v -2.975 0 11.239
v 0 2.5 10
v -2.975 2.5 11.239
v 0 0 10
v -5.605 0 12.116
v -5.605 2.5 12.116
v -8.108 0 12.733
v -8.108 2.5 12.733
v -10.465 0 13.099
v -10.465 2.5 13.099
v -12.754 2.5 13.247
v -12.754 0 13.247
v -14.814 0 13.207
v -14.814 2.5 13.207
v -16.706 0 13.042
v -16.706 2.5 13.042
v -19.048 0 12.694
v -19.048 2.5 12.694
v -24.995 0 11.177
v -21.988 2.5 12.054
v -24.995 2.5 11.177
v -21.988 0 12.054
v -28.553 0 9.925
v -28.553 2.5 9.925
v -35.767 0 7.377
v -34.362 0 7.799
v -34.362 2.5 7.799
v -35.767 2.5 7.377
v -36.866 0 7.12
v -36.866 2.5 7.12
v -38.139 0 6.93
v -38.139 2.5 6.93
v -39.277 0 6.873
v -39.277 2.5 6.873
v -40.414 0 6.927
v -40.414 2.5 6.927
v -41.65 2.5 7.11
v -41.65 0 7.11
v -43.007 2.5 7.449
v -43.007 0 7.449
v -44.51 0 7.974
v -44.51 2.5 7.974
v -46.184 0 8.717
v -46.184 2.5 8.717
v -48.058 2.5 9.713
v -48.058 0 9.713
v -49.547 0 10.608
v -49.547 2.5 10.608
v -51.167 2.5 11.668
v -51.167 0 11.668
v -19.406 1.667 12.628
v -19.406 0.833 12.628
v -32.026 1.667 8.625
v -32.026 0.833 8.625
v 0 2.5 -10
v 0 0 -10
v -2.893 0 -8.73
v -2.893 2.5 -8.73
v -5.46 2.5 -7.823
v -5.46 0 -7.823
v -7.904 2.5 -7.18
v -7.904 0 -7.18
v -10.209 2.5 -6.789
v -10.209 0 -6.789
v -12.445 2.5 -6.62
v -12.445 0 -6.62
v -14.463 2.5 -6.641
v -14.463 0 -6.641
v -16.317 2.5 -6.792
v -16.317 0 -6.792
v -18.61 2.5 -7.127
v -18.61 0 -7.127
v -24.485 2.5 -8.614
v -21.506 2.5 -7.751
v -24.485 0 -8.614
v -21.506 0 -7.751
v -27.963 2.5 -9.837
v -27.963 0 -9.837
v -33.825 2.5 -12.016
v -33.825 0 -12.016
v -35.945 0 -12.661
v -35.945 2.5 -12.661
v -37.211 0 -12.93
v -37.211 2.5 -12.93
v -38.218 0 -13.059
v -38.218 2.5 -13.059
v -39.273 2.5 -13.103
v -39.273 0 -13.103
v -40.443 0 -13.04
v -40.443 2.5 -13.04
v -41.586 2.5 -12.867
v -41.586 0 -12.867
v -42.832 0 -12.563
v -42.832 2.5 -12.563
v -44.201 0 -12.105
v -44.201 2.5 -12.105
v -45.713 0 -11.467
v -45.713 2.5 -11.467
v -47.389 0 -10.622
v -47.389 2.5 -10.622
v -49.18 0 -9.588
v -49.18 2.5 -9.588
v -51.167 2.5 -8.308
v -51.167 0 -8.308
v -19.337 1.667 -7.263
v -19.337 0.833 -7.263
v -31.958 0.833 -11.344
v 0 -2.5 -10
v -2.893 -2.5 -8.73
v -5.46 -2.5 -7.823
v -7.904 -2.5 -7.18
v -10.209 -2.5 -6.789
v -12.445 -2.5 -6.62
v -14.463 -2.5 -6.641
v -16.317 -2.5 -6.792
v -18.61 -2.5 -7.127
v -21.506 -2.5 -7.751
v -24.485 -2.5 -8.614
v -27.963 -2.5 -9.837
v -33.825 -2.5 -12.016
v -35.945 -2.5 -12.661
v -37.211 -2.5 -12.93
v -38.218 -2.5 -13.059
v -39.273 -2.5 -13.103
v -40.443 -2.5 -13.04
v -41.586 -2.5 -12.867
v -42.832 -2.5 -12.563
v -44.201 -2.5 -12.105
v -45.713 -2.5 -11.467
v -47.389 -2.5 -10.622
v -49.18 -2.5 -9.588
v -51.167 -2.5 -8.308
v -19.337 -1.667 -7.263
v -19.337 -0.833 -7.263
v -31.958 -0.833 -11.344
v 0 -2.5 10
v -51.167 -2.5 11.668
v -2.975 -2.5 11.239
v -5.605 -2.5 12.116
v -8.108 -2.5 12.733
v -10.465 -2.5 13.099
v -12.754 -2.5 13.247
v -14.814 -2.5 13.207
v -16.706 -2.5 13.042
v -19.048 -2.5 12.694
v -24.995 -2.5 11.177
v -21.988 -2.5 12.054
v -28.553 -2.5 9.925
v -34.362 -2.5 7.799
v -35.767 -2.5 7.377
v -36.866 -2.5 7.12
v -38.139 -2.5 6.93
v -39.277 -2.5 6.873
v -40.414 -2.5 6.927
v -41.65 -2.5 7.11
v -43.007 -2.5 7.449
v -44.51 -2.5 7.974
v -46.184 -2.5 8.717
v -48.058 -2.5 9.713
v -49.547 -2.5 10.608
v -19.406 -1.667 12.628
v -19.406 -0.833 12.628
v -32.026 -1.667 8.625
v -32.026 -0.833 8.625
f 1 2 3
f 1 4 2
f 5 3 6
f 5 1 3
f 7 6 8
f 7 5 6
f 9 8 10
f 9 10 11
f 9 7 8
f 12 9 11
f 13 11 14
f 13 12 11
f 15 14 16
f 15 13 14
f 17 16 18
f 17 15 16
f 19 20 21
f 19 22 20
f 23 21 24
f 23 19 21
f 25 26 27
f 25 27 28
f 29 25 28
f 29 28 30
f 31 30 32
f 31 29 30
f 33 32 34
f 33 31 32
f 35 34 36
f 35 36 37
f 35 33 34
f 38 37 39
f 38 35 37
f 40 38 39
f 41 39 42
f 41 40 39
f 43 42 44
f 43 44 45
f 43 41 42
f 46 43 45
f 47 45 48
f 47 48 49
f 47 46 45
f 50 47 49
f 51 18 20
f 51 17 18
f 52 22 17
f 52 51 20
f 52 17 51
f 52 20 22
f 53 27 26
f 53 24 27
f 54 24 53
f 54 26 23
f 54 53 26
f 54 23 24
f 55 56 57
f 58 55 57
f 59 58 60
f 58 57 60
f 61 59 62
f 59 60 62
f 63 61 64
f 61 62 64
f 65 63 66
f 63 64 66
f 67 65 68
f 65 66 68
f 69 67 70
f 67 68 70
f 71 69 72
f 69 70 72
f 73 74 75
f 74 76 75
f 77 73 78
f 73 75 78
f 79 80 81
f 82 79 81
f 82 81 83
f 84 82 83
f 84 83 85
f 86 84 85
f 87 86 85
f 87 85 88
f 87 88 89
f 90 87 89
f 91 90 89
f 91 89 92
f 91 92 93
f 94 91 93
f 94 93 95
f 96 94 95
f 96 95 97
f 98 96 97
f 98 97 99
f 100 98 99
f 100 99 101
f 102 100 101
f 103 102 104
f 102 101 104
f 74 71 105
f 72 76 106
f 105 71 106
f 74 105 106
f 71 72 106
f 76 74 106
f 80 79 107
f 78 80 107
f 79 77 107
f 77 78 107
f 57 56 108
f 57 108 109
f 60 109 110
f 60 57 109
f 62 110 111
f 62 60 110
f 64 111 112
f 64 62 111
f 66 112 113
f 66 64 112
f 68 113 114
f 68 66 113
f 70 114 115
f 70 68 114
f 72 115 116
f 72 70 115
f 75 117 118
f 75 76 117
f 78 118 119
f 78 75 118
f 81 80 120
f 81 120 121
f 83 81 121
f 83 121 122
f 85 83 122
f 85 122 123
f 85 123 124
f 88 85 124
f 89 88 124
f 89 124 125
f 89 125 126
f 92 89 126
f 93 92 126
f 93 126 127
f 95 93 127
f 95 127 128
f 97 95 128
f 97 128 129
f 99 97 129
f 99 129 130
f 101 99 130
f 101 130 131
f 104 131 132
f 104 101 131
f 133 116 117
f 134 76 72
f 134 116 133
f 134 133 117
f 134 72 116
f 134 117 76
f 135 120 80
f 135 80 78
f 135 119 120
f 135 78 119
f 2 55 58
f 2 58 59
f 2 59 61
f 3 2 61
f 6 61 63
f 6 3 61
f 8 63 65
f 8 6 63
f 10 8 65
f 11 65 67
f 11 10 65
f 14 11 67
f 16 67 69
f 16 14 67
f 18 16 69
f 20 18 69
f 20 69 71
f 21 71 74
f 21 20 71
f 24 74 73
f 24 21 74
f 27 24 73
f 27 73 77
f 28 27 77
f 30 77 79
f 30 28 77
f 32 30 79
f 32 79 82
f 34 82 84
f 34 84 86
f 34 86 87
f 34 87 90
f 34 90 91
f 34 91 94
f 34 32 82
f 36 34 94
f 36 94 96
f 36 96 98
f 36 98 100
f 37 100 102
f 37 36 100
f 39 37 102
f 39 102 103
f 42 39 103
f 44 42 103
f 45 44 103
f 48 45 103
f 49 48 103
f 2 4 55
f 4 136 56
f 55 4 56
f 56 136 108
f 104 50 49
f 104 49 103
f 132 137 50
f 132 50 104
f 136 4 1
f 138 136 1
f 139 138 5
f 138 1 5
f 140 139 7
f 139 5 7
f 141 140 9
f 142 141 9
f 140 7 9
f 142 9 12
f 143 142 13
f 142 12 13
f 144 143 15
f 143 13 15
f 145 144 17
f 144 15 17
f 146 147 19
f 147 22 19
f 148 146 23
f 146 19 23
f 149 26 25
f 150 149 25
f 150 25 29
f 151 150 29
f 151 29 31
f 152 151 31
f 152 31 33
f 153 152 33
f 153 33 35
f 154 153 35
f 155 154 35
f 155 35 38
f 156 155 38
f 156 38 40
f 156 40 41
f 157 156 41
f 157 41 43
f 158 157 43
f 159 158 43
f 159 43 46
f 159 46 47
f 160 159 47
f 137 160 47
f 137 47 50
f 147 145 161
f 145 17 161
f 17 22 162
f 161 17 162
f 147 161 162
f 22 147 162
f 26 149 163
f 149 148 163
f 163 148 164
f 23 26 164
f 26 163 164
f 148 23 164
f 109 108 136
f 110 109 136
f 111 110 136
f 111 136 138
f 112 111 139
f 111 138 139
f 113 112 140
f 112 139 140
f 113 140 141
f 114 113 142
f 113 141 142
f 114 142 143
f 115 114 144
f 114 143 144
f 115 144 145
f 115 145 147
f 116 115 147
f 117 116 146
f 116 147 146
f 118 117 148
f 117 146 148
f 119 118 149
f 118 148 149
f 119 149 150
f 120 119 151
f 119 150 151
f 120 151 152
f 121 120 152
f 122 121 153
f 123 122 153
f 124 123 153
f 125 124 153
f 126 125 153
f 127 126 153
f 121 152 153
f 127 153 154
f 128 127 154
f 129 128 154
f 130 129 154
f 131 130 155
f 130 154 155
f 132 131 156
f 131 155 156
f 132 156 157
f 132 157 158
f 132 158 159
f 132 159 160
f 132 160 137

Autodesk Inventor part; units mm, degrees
ref_plane "YZ Plane" through (0, 0, 0) normal (1, 0, 0) x (0, 1, 0)
ref_plane "XZ Plane" through (0, 0, 0) normal (0, 1, 0) x (-1, 0, 0)
ref_plane "XY Plane" through (0, 0, 0) normal (0, 0, 1) x (1, 0, 0)
sketch "Sketch1" plane through (0, 0, 0) normal (0, 1, 0) x (-1, 0, 0)
  line L0 (0, 10) -> (0, -10)
  line L1 (51.1673, 11.668) -> (51.1673, -8.3082)
  line L2 (0, 10) -> (7.8343, 13.5739) construction
  line L3 (7.8343, 13.5739) -> (16.9195, 13.5739) construction
  line L4 (16.9195, 13.5739) -> (25.4703, 11.668) construction
  line L5 (25.4703, 11.668) -> (35.09, 7.0272) construction
  line L6 (35.09, 7.0272) -> (42.1712, 5.5575) construction
  line L7 (42.1712, 5.5575) -> (51.1673, 11.668) construction
  spline S0 degree 4 poles (0, 10) (7.8343, 13.5739) (16.9195, 13.5739) (25.4703, 11.668) (35.09, 7.0272) (42.1712, 5.5575) (51.1673, 11.668) knots 1 1 1 1 1 2 3 4 4 4 4 4
  line L8 (0, -10) -> (7.7654, -6.2687) construction
  line L9 (7.7654, -6.2687) -> (16.8507, -6.2687) construction
  line L10 (16.8507, -6.2687) -> (25.4015, -8.3082) construction
  line L11 (25.4015, -8.3082) -> (35.0212, -12.949) construction
  line L12 (35.0212, -12.949) -> (42.1023, -14.4187) construction
  line L13 (42.1023, -14.4187) -> (51.1673, -8.3082) construction
  spline S1 degree 4 poles (0, -10) (7.7654, -6.2687) (16.8507, -6.2687) (25.4015, -8.3082) (35.0212, -12.949) (42.1023, -14.4187) (51.1673, -8.3082) knots 1 1 1 1 1 2 3 4 4 4 4 4
  point P0 (0, 0)
extrude "Extrusion1" add sketch "Sketch1" along normal mid plane 5
properties part number "ThickThinProfile"
